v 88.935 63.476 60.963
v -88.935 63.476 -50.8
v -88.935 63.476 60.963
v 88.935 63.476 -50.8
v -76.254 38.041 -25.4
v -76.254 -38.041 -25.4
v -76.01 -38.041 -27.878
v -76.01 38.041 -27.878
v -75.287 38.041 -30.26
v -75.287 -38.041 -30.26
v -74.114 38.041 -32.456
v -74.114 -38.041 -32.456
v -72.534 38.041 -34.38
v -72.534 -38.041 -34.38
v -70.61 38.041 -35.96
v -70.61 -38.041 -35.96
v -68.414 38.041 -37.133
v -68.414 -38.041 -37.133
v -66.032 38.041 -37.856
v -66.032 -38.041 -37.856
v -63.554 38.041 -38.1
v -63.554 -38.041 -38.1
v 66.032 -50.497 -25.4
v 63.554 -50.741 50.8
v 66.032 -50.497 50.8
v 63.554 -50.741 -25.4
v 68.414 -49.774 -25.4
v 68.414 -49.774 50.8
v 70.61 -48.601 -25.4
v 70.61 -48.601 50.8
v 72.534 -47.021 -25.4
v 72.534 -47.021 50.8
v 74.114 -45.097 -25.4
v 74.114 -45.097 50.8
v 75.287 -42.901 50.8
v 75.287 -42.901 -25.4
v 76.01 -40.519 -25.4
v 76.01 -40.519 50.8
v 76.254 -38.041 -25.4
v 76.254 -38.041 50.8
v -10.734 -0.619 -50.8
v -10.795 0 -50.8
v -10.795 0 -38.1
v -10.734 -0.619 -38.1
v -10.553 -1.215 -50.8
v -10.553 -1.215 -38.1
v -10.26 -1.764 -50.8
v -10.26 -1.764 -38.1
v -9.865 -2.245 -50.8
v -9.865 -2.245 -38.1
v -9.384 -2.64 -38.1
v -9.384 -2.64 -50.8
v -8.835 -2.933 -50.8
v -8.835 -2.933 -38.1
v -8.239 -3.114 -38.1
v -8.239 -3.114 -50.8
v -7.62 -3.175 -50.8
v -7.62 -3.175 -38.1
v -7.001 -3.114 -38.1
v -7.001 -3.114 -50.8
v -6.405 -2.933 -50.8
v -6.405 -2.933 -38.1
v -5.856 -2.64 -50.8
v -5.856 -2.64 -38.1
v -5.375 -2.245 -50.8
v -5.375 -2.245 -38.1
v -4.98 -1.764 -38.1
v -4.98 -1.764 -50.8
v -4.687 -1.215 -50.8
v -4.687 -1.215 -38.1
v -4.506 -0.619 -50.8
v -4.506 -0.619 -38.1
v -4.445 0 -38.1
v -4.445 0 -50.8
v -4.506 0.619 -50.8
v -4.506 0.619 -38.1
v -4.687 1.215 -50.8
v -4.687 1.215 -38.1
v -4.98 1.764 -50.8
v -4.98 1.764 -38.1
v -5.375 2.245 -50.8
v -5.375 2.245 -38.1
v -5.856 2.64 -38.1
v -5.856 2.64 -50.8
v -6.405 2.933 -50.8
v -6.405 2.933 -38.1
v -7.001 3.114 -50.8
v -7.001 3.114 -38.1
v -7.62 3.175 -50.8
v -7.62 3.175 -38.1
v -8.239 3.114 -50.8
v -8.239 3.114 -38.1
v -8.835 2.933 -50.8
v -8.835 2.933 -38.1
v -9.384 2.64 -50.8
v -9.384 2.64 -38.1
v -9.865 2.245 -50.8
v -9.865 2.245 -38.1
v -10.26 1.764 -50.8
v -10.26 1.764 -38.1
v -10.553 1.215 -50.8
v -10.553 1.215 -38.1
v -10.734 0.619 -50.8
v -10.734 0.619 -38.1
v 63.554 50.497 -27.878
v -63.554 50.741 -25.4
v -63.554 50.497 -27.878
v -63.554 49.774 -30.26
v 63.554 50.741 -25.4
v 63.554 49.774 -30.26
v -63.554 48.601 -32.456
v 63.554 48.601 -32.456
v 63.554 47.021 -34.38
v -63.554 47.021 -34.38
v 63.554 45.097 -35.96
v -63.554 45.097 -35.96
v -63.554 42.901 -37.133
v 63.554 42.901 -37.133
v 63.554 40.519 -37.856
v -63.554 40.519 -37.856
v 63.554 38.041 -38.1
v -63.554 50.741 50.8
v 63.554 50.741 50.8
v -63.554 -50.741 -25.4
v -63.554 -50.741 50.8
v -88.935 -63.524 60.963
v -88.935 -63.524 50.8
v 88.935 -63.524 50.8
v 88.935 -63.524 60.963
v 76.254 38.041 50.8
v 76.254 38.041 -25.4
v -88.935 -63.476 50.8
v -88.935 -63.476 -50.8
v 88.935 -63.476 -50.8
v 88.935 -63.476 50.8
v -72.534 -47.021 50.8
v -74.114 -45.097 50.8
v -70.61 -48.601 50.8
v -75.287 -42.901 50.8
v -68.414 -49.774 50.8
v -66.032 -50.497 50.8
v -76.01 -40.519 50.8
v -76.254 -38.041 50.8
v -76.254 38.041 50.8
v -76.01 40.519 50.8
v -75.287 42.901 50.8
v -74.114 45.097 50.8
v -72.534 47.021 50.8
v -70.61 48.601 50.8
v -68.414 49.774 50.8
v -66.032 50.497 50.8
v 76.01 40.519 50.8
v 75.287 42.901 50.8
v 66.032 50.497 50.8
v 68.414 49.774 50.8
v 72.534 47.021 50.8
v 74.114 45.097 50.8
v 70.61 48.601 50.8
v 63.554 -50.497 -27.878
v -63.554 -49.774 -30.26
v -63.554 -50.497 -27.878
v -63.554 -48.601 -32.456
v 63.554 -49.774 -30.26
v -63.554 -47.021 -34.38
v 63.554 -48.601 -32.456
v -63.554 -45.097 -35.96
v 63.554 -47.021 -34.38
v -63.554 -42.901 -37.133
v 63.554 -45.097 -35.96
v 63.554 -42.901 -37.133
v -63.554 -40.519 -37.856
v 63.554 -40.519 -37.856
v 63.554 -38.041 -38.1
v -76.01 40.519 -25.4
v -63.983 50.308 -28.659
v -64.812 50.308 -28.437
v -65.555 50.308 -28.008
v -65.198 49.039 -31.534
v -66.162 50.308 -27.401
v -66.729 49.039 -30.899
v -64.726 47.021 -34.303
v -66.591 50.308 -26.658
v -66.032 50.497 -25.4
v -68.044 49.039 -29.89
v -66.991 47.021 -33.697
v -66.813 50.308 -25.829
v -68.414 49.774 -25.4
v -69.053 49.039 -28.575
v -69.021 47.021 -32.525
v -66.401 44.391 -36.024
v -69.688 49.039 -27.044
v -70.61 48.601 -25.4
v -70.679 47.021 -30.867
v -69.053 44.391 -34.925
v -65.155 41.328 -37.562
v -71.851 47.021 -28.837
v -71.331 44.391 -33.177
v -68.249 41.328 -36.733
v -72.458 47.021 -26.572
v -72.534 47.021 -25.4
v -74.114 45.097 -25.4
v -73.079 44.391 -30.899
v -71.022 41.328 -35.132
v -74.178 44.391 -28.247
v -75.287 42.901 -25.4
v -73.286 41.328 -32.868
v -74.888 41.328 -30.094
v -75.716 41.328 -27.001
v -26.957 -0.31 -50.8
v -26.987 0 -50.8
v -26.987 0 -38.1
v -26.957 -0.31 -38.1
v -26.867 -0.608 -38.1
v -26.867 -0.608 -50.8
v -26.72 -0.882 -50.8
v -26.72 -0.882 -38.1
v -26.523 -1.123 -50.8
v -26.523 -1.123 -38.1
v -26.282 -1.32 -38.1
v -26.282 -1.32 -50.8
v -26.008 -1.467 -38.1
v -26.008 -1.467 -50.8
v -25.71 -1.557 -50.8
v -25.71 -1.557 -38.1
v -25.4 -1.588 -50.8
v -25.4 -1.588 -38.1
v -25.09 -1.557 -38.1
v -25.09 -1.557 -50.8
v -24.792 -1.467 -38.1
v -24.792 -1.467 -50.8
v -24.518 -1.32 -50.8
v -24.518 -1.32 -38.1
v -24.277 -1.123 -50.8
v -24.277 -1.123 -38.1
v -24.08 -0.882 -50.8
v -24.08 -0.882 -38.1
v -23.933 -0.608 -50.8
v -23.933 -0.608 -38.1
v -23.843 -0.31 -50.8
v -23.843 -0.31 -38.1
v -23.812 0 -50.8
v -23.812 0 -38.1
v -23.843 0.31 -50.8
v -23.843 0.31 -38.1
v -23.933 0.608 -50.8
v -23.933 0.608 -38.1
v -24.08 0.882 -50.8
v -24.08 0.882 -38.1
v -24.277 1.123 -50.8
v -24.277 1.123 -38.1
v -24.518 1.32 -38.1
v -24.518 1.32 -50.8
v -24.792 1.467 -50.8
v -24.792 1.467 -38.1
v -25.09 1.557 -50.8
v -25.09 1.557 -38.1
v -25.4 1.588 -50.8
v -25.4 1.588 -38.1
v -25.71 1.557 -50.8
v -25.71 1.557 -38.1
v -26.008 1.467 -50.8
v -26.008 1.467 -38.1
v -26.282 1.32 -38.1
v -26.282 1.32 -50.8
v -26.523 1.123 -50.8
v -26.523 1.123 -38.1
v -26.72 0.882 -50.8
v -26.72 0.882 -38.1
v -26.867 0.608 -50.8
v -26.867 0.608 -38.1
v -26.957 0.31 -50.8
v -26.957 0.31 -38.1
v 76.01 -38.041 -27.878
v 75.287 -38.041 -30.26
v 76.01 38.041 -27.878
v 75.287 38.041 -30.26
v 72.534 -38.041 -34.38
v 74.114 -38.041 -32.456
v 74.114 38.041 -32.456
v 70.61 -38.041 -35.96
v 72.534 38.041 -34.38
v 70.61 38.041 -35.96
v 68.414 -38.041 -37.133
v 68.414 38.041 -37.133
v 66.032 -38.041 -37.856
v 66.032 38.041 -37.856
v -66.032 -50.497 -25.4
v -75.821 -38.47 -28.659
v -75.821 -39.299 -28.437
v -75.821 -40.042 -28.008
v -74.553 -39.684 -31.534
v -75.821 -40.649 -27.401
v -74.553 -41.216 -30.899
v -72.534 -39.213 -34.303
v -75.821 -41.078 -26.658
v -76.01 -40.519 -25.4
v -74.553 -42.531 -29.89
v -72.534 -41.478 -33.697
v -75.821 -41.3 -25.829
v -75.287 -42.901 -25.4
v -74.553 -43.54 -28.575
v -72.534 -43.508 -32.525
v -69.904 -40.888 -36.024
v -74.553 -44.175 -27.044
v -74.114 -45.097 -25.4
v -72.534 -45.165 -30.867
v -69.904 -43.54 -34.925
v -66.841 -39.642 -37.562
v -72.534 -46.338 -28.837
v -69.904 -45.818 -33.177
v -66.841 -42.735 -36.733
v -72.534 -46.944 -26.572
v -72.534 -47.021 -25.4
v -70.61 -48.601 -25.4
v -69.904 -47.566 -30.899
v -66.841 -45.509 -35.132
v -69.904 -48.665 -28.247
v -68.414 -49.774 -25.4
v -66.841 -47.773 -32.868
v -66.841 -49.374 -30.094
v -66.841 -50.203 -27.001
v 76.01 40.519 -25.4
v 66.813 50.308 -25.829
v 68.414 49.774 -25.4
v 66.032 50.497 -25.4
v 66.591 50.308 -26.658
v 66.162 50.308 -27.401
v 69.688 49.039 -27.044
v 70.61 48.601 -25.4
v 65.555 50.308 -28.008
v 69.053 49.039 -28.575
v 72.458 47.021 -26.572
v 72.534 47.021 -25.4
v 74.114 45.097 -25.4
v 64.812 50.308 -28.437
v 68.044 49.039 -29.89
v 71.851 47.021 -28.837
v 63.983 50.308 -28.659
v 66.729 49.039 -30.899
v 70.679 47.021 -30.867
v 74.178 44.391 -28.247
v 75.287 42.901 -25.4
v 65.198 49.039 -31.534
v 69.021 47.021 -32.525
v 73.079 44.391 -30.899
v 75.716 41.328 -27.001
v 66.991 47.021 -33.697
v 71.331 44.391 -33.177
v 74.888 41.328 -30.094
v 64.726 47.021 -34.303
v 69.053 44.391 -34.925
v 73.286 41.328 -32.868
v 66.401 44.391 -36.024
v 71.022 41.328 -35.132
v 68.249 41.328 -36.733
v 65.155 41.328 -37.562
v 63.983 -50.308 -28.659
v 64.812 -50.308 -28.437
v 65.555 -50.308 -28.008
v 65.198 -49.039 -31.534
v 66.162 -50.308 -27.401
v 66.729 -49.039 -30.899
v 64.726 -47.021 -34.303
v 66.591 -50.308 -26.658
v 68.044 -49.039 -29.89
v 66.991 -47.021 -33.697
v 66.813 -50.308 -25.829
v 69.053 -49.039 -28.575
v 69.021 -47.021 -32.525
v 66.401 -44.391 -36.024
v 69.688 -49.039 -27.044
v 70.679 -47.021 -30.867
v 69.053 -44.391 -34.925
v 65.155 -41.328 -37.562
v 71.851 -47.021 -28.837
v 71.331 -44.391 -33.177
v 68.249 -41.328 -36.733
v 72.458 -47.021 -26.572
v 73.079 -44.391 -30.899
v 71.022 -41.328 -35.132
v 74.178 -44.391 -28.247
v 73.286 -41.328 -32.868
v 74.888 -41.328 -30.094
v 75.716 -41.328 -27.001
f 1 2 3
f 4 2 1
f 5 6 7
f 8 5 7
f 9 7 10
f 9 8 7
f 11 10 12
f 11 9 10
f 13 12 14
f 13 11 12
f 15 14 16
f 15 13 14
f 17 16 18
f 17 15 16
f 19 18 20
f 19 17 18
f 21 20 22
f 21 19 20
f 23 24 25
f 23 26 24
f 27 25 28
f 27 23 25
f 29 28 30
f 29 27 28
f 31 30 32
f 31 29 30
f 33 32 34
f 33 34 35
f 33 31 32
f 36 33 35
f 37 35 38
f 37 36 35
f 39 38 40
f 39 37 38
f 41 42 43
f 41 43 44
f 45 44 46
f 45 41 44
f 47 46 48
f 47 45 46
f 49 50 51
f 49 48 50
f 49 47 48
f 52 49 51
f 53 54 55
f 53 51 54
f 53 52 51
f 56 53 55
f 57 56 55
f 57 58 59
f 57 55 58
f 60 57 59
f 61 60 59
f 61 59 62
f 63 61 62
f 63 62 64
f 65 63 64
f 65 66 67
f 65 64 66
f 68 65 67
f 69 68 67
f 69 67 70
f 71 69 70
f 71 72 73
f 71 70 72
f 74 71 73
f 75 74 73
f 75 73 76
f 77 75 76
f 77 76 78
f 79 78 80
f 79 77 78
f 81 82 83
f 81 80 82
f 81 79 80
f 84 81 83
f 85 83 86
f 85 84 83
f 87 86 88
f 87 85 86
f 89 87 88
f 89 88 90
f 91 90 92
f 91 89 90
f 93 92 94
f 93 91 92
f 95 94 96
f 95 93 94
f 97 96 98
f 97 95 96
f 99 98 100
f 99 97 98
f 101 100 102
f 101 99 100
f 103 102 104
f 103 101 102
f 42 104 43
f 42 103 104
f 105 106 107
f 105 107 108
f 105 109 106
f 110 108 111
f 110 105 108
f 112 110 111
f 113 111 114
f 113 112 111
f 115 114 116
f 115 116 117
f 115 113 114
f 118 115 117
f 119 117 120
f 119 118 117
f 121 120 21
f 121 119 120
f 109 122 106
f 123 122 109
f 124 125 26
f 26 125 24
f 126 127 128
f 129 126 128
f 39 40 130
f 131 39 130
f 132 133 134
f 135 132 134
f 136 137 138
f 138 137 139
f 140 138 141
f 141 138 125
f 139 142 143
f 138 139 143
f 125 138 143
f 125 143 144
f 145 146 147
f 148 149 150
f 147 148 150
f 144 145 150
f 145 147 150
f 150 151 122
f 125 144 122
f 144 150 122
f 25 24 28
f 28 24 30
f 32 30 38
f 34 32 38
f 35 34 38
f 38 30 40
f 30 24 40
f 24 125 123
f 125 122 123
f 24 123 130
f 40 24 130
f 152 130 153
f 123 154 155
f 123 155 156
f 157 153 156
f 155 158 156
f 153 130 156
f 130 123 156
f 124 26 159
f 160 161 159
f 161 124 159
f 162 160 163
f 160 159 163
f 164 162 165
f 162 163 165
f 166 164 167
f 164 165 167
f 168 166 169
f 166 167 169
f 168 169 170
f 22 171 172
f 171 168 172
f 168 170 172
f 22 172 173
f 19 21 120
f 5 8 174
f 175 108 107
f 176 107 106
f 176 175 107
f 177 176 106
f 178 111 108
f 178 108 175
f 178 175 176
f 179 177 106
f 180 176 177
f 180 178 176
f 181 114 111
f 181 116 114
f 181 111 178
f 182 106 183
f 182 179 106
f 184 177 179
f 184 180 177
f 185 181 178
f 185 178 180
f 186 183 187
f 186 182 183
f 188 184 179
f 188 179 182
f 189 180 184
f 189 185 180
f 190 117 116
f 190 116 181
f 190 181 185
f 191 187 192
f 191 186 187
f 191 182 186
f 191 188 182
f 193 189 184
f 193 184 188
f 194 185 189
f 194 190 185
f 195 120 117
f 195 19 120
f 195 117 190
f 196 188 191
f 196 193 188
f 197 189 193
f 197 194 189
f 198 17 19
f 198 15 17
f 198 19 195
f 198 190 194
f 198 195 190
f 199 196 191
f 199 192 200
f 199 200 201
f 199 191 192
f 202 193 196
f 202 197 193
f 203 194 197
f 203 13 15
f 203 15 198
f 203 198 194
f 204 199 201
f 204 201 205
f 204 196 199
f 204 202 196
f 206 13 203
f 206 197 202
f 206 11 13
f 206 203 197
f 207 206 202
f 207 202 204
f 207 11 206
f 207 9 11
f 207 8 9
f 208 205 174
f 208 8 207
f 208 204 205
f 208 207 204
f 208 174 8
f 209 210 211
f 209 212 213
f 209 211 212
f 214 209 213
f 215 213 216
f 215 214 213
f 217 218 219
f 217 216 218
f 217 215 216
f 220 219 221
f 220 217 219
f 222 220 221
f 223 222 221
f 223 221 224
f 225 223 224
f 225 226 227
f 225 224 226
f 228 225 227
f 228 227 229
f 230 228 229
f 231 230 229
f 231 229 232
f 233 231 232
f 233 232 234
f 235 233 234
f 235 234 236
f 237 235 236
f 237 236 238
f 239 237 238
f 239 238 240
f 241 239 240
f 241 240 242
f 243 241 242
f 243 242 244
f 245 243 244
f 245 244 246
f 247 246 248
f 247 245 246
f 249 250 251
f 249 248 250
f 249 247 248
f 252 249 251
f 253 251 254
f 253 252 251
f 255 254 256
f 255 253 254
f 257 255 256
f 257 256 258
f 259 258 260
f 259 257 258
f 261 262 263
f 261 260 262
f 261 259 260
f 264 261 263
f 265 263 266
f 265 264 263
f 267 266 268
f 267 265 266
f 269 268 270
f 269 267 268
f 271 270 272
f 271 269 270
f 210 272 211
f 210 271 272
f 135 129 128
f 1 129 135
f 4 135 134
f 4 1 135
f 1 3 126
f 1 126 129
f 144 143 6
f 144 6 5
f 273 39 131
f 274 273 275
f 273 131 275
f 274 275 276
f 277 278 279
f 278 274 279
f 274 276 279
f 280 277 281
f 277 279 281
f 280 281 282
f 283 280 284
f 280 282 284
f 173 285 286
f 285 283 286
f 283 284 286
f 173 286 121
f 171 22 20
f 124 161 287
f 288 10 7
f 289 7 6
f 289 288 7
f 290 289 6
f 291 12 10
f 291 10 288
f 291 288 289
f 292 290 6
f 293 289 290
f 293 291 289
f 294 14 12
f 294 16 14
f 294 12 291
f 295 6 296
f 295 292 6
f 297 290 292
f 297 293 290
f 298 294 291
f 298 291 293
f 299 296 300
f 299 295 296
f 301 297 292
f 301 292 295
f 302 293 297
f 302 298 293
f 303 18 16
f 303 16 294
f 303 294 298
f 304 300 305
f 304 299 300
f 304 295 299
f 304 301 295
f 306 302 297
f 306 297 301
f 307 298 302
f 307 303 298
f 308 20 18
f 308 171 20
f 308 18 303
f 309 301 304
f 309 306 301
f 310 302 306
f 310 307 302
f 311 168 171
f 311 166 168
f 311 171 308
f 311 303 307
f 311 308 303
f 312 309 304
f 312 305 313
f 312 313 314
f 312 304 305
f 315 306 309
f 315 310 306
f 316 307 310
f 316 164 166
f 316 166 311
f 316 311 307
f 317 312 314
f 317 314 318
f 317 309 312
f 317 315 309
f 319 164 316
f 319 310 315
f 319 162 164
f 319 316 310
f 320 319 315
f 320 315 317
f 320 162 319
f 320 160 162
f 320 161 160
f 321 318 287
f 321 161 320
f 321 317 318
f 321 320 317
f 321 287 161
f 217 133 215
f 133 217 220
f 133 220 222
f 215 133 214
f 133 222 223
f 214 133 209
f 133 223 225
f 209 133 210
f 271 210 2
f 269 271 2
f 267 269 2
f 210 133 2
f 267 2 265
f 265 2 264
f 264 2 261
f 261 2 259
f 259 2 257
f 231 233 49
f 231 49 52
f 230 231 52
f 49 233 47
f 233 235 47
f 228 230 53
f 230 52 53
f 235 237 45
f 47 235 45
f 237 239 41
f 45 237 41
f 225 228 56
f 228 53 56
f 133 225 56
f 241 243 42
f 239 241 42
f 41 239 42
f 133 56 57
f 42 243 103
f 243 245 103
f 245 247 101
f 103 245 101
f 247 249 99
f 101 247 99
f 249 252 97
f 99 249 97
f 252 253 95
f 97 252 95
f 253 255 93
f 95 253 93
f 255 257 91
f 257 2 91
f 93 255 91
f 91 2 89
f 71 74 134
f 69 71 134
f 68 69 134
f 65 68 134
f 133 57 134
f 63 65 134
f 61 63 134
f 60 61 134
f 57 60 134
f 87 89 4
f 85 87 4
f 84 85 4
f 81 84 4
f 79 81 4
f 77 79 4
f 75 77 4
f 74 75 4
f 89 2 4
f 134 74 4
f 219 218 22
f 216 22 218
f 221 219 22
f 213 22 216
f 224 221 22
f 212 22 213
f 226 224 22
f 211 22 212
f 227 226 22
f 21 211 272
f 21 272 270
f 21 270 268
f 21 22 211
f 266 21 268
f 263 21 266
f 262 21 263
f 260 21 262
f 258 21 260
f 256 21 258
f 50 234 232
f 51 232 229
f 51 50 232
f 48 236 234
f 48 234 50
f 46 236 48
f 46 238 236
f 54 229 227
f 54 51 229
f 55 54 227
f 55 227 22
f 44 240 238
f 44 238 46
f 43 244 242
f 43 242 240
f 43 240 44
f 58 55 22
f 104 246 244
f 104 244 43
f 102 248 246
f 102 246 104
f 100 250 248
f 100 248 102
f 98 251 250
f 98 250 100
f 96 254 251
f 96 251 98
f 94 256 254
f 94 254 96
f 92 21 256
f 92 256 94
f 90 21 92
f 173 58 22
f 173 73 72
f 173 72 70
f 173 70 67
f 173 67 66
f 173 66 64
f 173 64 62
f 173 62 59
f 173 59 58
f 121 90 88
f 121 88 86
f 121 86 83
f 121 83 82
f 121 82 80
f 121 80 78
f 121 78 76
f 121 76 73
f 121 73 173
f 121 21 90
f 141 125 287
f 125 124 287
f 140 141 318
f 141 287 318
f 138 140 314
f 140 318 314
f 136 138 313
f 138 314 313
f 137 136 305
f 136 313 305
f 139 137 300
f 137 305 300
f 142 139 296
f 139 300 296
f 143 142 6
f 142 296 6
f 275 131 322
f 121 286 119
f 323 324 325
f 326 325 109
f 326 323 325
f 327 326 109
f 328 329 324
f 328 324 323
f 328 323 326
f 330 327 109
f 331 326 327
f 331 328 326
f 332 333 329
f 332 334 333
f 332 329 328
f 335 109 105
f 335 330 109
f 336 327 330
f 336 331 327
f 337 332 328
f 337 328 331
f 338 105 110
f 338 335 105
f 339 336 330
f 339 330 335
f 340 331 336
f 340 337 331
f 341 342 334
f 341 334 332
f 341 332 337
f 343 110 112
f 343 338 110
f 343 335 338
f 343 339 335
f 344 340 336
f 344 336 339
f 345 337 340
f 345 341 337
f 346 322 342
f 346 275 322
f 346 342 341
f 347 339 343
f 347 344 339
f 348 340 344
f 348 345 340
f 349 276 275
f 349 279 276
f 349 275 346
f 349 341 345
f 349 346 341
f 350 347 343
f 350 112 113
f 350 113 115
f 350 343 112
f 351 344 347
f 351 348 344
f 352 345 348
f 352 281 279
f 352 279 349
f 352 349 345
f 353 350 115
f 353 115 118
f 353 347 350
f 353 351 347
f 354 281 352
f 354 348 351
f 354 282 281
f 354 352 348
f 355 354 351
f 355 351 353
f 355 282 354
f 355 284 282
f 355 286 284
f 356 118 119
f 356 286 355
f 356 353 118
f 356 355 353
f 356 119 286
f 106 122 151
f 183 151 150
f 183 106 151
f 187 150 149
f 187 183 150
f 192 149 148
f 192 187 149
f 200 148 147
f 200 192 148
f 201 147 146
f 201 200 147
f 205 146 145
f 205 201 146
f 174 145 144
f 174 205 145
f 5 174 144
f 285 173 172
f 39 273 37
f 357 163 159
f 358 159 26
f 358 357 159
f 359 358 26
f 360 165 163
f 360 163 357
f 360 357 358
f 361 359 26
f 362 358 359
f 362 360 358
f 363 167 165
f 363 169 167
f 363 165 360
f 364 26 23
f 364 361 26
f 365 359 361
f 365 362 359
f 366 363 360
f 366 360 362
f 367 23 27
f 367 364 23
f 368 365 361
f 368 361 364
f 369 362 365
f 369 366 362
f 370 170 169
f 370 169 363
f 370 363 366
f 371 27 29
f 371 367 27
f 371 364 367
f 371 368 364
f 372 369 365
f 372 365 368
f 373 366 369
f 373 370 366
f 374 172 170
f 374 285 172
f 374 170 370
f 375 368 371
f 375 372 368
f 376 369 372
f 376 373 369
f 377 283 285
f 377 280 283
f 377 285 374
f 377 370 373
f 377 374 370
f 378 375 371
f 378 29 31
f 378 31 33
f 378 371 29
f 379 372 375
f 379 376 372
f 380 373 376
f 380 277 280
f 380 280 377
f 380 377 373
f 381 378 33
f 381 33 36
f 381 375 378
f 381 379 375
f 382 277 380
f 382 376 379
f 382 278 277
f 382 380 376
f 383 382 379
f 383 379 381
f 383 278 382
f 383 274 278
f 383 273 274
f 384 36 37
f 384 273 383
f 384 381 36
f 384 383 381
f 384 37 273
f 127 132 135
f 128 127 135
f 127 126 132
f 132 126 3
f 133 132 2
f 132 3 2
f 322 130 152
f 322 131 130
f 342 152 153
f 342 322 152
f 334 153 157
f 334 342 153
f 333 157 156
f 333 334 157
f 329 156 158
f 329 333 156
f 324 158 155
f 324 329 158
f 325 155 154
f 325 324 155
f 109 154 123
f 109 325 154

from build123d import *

# Parameters (mm, degrees)
BOSS_EXTRUDE1_DEPTH      = 50.8
BOSS_EXTRUDE1_DEPTH_BACK = 50.8
SKETCH1_W                = 177.870967952
SKETCH1_H                = 126.951722988
SKETCH3_W                = 152.508374468
SKETCH3_H                = 101.481852174
CUT_EXTRUDE1_DEPTH       = 88.9
FILLET1_R                = 12.7
CUT_EXTRUDE2_DEPTH       = 138.938
CUT_EXTRUDE2_DEPTH_BACK  = 127
SKETCH4_R                = 1.5875
CUT_EXTRUDE3_DEPTH       = 141.861333596
CUT_EXTRUDE3_DEPTH_BACK  = 36.576
SKETCH5_R                = 3.175
SKETCH6_W                = 177.870967952
SKETCH6_H                = 10.163315621
BOSS_EXTRUDE2_DEPTH      = 127


with BuildPart() as part:
    # Sketch1 → Boss-Extrude1 (new, two sides: drawn at the far end of the back side and taken through both)
    with BuildSketch(Plane.XY.offset(-BOSS_EXTRUDE1_DEPTH_BACK)):
        Rectangle(SKETCH1_W, SKETCH1_H)
    extrude(amount=BOSS_EXTRUDE1_DEPTH + BOSS_EXTRUDE1_DEPTH_BACK)

    # Sketch3 → Cut-Extrude1 (cut)
    with BuildSketch(Plane.XY.offset(50.8)):
        Rectangle(SKETCH3_W, SKETCH3_H)
    extrude(amount=-CUT_EXTRUDE1_DEPTH, mode=Mode.SUBTRACT)

    # Fillet1
    fillet1_edges = [part.edges().sort_by_distance(p)[0] for p in [
        (-76.254187234, -50.740926087, 6.35),
        (-76.254187234, 0, -38.1),
        (0, 50.740926087, -38.1),
        (76.254187234, 0, -38.1),
        (0, -50.740926087, -38.1),
        (76.254187234, -50.740926087, 6.35),
        (76.254187234, 50.740926087, 6.35),
        (-76.254187234, 50.740926087, 6.35),
    ]]
    fillet(fillet1_edges, radius=FILLET1_R)

    # Sketch4 → Cut-Extrude2 (cut, two sides: drawn at the far end of the back side and taken through both)
    with BuildSketch(Plane.XY.offset(-38.1).offset(-CUT_EXTRUDE2_DEPTH_BACK)):
        with Locations((-25.4, 0)):
            Circle(SKETCH4_R)
    extrude(amount=CUT_EXTRUDE2_DEPTH + CUT_EXTRUDE2_DEPTH_BACK, mode=Mode.SUBTRACT)

    # Sketch5 → Cut-Extrude3 (cut, two sides: drawn at the far end of the back side and taken through both)
    with BuildSketch(Plane.XY.offset(-38.1).offset(-CUT_EXTRUDE3_DEPTH_BACK)):
        with Locations((-7.62, 0)):
            Circle(SKETCH5_R)
    extrude(amount=CUT_EXTRUDE3_DEPTH + CUT_EXTRUDE3_DEPTH_BACK, mode=Mode.SUBTRACT)

    # Sketch6 → Boss-Extrude2 (add)
    with BuildSketch(Plane(origin=(0, 63.475861494, 0), x_dir=(1, 0, 0), z_dir=(0, 1, 0))):
        with Locations((0, -55.881657811)):
            Rectangle(SKETCH6_W, SKETCH6_H)
    extrude(amount=-BOSS_EXTRUDE2_DEPTH)


solid = part.part
